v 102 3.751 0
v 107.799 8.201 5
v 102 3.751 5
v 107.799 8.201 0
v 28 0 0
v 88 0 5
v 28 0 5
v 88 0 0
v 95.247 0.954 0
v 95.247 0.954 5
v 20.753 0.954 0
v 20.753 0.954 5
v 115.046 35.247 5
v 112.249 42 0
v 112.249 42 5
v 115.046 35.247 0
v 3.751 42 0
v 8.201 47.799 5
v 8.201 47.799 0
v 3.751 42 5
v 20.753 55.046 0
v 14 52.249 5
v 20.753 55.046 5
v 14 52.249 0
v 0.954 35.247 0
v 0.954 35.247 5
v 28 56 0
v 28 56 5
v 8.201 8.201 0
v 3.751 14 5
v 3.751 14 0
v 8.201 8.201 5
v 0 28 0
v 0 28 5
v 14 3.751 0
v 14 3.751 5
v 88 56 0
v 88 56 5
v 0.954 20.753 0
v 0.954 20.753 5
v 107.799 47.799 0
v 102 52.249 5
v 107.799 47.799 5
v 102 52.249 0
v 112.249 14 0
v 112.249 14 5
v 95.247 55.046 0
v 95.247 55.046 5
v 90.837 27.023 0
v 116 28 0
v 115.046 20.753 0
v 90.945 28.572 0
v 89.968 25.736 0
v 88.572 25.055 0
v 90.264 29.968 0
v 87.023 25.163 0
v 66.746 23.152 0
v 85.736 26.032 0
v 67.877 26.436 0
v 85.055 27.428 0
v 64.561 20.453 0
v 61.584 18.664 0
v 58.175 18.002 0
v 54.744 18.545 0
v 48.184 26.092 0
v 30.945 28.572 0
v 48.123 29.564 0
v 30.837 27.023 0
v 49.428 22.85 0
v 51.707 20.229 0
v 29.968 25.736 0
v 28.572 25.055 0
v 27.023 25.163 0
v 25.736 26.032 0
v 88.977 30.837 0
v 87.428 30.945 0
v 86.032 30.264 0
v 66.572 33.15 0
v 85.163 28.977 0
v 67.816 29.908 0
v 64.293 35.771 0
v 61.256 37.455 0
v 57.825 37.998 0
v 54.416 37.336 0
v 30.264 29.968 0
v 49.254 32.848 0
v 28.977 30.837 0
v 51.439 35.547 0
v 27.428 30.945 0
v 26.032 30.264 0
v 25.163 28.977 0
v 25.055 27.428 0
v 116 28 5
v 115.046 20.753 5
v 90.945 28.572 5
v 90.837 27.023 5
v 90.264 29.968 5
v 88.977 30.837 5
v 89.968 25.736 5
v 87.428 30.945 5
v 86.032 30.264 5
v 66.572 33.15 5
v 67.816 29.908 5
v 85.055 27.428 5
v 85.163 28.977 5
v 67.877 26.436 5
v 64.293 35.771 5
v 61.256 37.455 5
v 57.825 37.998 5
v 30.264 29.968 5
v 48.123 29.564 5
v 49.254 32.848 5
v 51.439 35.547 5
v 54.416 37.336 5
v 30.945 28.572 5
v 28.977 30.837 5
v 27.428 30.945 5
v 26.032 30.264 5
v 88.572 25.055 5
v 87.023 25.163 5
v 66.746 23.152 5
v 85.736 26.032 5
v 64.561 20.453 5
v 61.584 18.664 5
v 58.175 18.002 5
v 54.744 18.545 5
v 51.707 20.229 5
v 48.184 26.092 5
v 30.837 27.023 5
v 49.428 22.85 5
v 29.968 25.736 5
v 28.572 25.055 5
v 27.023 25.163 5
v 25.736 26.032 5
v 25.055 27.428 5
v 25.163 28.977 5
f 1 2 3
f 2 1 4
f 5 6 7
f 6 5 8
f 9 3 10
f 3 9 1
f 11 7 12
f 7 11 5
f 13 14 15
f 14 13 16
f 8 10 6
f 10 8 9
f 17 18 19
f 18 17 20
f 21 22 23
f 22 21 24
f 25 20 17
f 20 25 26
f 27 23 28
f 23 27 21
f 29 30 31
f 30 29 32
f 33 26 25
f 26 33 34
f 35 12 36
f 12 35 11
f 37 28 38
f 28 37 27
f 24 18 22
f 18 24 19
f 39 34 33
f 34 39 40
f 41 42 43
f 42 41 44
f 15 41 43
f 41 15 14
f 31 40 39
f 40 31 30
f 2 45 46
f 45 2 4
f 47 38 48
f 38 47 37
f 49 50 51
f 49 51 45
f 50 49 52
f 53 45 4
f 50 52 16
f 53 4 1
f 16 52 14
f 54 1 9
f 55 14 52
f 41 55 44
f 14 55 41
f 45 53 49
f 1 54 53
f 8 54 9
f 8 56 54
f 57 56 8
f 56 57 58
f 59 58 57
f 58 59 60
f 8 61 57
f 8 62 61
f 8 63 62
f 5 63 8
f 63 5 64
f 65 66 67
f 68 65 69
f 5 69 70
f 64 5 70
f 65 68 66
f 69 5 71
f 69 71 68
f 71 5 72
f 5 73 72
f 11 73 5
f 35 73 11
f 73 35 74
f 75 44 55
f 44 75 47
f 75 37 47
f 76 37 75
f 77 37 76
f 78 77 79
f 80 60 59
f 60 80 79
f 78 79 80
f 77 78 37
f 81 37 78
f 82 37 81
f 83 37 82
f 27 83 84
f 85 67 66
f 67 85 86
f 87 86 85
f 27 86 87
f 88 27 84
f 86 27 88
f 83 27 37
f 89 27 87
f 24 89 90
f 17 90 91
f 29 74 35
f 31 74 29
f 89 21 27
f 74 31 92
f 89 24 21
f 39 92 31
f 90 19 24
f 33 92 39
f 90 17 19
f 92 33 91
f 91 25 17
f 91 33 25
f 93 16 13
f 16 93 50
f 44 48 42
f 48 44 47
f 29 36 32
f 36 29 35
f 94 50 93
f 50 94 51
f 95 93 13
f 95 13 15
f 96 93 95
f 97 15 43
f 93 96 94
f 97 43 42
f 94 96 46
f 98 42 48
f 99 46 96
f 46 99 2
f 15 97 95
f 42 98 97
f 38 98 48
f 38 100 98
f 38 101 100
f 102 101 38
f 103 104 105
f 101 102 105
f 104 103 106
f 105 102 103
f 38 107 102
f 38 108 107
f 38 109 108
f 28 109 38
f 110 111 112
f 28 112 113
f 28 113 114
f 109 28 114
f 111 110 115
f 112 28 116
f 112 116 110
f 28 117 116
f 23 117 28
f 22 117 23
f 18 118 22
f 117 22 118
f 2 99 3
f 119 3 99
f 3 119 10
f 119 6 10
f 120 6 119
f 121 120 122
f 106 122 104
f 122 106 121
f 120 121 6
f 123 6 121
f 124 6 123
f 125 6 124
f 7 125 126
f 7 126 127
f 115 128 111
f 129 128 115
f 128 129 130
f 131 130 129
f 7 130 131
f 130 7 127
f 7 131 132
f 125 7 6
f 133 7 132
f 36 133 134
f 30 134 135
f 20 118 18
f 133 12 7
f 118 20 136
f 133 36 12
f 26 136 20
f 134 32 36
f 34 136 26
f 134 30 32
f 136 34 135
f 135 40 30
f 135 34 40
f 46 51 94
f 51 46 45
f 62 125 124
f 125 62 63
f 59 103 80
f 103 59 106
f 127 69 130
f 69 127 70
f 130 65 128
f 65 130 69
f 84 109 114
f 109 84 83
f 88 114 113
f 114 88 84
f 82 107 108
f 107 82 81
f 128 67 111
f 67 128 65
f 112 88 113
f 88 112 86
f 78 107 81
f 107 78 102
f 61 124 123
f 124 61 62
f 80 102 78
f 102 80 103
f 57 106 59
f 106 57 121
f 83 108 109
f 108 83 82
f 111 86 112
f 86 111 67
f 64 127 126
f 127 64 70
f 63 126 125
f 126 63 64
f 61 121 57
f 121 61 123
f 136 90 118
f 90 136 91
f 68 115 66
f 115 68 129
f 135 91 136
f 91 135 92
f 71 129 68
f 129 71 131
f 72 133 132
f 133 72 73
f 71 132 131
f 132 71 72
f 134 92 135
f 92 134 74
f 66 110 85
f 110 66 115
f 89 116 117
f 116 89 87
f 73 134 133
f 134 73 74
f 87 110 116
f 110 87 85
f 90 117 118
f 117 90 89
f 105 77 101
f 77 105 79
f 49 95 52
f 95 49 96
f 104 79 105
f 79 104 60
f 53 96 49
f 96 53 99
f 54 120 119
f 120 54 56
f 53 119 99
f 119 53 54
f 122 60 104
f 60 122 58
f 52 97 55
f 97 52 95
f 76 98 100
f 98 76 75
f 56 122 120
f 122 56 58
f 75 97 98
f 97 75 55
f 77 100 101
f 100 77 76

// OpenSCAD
$fn = 32;

// ----------------------------------------------------------------------
// Spacer plate: obround span 60, caps R28
// ----------------------------------------------------------------------

// --- parameters (mm) ---
bore_r = 10;              // centre bore radius
bolt_r = 3;               // bolt hole radius
plate_t = 5;              // plate thickness, Z (extrusion height)
span = 60;                // obround span
cap_r = 28;               // cap radius
fit_tol = 0.02;           // declared fit tolerance (prompt contract)
free_tol = 0.2;           // declared free tolerance (prompt contract)

profile = [[28, 56], [20.753, 55.046], [14, 52.249], [8.201, 47.799], [3.751, 42], [0.954, 35.247], [0, 28], [0.954, 20.753], [3.751, 14], [8.201, 8.201], [14, 3.751], [20.753, 0.954], [28, 0], [88, 0], [95.247, 0.954], [102, 3.751], [107.799, 8.201], [112.249, 14], [115.046, 20.753], [116, 28], [115.046, 35.247], [112.249, 42], [107.799, 47.799], [102, 52.249], [95.247, 55.046], [88, 56]];  // primary outline, 26 points, counter clockwise
void_1 = [[67.816, 29.908], [66.572, 33.15], [64.293, 35.771], [61.256, 37.455], [57.825, 37.998], [54.416, 37.336], [51.439, 35.547], [49.254, 32.848], [48.123, 29.564], [48.184, 26.092], [49.428, 22.85], [51.707, 20.229], [54.744, 18.545], [58.175, 18.002], [61.584, 18.664], [64.561, 20.453], [66.746, 23.152], [67.877, 26.436]];  // centre bore, 18 points
void_2 = [[30.945, 28.572], [30.264, 29.968], [28.977, 30.837], [27.428, 30.945], [26.032, 30.264], [25.163, 28.977], [25.055, 27.428], [25.736, 26.032], [27.023, 25.163], [28.572, 25.055], [29.968, 25.736], [30.837, 27.023]];  // end hole, 12 points
void_3 = [[90.945, 28.572], [90.264, 29.968], [88.977, 30.837], [87.428, 30.945], [86.032, 30.264], [85.163, 28.977], [85.055, 27.428], [85.736, 26.032], [87.023, 25.163], [88.572, 25.055], [89.968, 25.736], [90.837, 27.023]];  // end hole, 12 points

// --- the one profile operation ---
difference() {
  linear_extrude(height = plate_t) polygon(points = profile);
  translate([0, 0, -1])
    linear_extrude(height = plate_t + 2) polygon(points = void_1);
  translate([0, 0, -1])
    linear_extrude(height = plate_t + 2) polygon(points = void_2);
  translate([0, 0, -1])
    linear_extrude(height = plate_t + 2) polygon(points = void_3);
}
